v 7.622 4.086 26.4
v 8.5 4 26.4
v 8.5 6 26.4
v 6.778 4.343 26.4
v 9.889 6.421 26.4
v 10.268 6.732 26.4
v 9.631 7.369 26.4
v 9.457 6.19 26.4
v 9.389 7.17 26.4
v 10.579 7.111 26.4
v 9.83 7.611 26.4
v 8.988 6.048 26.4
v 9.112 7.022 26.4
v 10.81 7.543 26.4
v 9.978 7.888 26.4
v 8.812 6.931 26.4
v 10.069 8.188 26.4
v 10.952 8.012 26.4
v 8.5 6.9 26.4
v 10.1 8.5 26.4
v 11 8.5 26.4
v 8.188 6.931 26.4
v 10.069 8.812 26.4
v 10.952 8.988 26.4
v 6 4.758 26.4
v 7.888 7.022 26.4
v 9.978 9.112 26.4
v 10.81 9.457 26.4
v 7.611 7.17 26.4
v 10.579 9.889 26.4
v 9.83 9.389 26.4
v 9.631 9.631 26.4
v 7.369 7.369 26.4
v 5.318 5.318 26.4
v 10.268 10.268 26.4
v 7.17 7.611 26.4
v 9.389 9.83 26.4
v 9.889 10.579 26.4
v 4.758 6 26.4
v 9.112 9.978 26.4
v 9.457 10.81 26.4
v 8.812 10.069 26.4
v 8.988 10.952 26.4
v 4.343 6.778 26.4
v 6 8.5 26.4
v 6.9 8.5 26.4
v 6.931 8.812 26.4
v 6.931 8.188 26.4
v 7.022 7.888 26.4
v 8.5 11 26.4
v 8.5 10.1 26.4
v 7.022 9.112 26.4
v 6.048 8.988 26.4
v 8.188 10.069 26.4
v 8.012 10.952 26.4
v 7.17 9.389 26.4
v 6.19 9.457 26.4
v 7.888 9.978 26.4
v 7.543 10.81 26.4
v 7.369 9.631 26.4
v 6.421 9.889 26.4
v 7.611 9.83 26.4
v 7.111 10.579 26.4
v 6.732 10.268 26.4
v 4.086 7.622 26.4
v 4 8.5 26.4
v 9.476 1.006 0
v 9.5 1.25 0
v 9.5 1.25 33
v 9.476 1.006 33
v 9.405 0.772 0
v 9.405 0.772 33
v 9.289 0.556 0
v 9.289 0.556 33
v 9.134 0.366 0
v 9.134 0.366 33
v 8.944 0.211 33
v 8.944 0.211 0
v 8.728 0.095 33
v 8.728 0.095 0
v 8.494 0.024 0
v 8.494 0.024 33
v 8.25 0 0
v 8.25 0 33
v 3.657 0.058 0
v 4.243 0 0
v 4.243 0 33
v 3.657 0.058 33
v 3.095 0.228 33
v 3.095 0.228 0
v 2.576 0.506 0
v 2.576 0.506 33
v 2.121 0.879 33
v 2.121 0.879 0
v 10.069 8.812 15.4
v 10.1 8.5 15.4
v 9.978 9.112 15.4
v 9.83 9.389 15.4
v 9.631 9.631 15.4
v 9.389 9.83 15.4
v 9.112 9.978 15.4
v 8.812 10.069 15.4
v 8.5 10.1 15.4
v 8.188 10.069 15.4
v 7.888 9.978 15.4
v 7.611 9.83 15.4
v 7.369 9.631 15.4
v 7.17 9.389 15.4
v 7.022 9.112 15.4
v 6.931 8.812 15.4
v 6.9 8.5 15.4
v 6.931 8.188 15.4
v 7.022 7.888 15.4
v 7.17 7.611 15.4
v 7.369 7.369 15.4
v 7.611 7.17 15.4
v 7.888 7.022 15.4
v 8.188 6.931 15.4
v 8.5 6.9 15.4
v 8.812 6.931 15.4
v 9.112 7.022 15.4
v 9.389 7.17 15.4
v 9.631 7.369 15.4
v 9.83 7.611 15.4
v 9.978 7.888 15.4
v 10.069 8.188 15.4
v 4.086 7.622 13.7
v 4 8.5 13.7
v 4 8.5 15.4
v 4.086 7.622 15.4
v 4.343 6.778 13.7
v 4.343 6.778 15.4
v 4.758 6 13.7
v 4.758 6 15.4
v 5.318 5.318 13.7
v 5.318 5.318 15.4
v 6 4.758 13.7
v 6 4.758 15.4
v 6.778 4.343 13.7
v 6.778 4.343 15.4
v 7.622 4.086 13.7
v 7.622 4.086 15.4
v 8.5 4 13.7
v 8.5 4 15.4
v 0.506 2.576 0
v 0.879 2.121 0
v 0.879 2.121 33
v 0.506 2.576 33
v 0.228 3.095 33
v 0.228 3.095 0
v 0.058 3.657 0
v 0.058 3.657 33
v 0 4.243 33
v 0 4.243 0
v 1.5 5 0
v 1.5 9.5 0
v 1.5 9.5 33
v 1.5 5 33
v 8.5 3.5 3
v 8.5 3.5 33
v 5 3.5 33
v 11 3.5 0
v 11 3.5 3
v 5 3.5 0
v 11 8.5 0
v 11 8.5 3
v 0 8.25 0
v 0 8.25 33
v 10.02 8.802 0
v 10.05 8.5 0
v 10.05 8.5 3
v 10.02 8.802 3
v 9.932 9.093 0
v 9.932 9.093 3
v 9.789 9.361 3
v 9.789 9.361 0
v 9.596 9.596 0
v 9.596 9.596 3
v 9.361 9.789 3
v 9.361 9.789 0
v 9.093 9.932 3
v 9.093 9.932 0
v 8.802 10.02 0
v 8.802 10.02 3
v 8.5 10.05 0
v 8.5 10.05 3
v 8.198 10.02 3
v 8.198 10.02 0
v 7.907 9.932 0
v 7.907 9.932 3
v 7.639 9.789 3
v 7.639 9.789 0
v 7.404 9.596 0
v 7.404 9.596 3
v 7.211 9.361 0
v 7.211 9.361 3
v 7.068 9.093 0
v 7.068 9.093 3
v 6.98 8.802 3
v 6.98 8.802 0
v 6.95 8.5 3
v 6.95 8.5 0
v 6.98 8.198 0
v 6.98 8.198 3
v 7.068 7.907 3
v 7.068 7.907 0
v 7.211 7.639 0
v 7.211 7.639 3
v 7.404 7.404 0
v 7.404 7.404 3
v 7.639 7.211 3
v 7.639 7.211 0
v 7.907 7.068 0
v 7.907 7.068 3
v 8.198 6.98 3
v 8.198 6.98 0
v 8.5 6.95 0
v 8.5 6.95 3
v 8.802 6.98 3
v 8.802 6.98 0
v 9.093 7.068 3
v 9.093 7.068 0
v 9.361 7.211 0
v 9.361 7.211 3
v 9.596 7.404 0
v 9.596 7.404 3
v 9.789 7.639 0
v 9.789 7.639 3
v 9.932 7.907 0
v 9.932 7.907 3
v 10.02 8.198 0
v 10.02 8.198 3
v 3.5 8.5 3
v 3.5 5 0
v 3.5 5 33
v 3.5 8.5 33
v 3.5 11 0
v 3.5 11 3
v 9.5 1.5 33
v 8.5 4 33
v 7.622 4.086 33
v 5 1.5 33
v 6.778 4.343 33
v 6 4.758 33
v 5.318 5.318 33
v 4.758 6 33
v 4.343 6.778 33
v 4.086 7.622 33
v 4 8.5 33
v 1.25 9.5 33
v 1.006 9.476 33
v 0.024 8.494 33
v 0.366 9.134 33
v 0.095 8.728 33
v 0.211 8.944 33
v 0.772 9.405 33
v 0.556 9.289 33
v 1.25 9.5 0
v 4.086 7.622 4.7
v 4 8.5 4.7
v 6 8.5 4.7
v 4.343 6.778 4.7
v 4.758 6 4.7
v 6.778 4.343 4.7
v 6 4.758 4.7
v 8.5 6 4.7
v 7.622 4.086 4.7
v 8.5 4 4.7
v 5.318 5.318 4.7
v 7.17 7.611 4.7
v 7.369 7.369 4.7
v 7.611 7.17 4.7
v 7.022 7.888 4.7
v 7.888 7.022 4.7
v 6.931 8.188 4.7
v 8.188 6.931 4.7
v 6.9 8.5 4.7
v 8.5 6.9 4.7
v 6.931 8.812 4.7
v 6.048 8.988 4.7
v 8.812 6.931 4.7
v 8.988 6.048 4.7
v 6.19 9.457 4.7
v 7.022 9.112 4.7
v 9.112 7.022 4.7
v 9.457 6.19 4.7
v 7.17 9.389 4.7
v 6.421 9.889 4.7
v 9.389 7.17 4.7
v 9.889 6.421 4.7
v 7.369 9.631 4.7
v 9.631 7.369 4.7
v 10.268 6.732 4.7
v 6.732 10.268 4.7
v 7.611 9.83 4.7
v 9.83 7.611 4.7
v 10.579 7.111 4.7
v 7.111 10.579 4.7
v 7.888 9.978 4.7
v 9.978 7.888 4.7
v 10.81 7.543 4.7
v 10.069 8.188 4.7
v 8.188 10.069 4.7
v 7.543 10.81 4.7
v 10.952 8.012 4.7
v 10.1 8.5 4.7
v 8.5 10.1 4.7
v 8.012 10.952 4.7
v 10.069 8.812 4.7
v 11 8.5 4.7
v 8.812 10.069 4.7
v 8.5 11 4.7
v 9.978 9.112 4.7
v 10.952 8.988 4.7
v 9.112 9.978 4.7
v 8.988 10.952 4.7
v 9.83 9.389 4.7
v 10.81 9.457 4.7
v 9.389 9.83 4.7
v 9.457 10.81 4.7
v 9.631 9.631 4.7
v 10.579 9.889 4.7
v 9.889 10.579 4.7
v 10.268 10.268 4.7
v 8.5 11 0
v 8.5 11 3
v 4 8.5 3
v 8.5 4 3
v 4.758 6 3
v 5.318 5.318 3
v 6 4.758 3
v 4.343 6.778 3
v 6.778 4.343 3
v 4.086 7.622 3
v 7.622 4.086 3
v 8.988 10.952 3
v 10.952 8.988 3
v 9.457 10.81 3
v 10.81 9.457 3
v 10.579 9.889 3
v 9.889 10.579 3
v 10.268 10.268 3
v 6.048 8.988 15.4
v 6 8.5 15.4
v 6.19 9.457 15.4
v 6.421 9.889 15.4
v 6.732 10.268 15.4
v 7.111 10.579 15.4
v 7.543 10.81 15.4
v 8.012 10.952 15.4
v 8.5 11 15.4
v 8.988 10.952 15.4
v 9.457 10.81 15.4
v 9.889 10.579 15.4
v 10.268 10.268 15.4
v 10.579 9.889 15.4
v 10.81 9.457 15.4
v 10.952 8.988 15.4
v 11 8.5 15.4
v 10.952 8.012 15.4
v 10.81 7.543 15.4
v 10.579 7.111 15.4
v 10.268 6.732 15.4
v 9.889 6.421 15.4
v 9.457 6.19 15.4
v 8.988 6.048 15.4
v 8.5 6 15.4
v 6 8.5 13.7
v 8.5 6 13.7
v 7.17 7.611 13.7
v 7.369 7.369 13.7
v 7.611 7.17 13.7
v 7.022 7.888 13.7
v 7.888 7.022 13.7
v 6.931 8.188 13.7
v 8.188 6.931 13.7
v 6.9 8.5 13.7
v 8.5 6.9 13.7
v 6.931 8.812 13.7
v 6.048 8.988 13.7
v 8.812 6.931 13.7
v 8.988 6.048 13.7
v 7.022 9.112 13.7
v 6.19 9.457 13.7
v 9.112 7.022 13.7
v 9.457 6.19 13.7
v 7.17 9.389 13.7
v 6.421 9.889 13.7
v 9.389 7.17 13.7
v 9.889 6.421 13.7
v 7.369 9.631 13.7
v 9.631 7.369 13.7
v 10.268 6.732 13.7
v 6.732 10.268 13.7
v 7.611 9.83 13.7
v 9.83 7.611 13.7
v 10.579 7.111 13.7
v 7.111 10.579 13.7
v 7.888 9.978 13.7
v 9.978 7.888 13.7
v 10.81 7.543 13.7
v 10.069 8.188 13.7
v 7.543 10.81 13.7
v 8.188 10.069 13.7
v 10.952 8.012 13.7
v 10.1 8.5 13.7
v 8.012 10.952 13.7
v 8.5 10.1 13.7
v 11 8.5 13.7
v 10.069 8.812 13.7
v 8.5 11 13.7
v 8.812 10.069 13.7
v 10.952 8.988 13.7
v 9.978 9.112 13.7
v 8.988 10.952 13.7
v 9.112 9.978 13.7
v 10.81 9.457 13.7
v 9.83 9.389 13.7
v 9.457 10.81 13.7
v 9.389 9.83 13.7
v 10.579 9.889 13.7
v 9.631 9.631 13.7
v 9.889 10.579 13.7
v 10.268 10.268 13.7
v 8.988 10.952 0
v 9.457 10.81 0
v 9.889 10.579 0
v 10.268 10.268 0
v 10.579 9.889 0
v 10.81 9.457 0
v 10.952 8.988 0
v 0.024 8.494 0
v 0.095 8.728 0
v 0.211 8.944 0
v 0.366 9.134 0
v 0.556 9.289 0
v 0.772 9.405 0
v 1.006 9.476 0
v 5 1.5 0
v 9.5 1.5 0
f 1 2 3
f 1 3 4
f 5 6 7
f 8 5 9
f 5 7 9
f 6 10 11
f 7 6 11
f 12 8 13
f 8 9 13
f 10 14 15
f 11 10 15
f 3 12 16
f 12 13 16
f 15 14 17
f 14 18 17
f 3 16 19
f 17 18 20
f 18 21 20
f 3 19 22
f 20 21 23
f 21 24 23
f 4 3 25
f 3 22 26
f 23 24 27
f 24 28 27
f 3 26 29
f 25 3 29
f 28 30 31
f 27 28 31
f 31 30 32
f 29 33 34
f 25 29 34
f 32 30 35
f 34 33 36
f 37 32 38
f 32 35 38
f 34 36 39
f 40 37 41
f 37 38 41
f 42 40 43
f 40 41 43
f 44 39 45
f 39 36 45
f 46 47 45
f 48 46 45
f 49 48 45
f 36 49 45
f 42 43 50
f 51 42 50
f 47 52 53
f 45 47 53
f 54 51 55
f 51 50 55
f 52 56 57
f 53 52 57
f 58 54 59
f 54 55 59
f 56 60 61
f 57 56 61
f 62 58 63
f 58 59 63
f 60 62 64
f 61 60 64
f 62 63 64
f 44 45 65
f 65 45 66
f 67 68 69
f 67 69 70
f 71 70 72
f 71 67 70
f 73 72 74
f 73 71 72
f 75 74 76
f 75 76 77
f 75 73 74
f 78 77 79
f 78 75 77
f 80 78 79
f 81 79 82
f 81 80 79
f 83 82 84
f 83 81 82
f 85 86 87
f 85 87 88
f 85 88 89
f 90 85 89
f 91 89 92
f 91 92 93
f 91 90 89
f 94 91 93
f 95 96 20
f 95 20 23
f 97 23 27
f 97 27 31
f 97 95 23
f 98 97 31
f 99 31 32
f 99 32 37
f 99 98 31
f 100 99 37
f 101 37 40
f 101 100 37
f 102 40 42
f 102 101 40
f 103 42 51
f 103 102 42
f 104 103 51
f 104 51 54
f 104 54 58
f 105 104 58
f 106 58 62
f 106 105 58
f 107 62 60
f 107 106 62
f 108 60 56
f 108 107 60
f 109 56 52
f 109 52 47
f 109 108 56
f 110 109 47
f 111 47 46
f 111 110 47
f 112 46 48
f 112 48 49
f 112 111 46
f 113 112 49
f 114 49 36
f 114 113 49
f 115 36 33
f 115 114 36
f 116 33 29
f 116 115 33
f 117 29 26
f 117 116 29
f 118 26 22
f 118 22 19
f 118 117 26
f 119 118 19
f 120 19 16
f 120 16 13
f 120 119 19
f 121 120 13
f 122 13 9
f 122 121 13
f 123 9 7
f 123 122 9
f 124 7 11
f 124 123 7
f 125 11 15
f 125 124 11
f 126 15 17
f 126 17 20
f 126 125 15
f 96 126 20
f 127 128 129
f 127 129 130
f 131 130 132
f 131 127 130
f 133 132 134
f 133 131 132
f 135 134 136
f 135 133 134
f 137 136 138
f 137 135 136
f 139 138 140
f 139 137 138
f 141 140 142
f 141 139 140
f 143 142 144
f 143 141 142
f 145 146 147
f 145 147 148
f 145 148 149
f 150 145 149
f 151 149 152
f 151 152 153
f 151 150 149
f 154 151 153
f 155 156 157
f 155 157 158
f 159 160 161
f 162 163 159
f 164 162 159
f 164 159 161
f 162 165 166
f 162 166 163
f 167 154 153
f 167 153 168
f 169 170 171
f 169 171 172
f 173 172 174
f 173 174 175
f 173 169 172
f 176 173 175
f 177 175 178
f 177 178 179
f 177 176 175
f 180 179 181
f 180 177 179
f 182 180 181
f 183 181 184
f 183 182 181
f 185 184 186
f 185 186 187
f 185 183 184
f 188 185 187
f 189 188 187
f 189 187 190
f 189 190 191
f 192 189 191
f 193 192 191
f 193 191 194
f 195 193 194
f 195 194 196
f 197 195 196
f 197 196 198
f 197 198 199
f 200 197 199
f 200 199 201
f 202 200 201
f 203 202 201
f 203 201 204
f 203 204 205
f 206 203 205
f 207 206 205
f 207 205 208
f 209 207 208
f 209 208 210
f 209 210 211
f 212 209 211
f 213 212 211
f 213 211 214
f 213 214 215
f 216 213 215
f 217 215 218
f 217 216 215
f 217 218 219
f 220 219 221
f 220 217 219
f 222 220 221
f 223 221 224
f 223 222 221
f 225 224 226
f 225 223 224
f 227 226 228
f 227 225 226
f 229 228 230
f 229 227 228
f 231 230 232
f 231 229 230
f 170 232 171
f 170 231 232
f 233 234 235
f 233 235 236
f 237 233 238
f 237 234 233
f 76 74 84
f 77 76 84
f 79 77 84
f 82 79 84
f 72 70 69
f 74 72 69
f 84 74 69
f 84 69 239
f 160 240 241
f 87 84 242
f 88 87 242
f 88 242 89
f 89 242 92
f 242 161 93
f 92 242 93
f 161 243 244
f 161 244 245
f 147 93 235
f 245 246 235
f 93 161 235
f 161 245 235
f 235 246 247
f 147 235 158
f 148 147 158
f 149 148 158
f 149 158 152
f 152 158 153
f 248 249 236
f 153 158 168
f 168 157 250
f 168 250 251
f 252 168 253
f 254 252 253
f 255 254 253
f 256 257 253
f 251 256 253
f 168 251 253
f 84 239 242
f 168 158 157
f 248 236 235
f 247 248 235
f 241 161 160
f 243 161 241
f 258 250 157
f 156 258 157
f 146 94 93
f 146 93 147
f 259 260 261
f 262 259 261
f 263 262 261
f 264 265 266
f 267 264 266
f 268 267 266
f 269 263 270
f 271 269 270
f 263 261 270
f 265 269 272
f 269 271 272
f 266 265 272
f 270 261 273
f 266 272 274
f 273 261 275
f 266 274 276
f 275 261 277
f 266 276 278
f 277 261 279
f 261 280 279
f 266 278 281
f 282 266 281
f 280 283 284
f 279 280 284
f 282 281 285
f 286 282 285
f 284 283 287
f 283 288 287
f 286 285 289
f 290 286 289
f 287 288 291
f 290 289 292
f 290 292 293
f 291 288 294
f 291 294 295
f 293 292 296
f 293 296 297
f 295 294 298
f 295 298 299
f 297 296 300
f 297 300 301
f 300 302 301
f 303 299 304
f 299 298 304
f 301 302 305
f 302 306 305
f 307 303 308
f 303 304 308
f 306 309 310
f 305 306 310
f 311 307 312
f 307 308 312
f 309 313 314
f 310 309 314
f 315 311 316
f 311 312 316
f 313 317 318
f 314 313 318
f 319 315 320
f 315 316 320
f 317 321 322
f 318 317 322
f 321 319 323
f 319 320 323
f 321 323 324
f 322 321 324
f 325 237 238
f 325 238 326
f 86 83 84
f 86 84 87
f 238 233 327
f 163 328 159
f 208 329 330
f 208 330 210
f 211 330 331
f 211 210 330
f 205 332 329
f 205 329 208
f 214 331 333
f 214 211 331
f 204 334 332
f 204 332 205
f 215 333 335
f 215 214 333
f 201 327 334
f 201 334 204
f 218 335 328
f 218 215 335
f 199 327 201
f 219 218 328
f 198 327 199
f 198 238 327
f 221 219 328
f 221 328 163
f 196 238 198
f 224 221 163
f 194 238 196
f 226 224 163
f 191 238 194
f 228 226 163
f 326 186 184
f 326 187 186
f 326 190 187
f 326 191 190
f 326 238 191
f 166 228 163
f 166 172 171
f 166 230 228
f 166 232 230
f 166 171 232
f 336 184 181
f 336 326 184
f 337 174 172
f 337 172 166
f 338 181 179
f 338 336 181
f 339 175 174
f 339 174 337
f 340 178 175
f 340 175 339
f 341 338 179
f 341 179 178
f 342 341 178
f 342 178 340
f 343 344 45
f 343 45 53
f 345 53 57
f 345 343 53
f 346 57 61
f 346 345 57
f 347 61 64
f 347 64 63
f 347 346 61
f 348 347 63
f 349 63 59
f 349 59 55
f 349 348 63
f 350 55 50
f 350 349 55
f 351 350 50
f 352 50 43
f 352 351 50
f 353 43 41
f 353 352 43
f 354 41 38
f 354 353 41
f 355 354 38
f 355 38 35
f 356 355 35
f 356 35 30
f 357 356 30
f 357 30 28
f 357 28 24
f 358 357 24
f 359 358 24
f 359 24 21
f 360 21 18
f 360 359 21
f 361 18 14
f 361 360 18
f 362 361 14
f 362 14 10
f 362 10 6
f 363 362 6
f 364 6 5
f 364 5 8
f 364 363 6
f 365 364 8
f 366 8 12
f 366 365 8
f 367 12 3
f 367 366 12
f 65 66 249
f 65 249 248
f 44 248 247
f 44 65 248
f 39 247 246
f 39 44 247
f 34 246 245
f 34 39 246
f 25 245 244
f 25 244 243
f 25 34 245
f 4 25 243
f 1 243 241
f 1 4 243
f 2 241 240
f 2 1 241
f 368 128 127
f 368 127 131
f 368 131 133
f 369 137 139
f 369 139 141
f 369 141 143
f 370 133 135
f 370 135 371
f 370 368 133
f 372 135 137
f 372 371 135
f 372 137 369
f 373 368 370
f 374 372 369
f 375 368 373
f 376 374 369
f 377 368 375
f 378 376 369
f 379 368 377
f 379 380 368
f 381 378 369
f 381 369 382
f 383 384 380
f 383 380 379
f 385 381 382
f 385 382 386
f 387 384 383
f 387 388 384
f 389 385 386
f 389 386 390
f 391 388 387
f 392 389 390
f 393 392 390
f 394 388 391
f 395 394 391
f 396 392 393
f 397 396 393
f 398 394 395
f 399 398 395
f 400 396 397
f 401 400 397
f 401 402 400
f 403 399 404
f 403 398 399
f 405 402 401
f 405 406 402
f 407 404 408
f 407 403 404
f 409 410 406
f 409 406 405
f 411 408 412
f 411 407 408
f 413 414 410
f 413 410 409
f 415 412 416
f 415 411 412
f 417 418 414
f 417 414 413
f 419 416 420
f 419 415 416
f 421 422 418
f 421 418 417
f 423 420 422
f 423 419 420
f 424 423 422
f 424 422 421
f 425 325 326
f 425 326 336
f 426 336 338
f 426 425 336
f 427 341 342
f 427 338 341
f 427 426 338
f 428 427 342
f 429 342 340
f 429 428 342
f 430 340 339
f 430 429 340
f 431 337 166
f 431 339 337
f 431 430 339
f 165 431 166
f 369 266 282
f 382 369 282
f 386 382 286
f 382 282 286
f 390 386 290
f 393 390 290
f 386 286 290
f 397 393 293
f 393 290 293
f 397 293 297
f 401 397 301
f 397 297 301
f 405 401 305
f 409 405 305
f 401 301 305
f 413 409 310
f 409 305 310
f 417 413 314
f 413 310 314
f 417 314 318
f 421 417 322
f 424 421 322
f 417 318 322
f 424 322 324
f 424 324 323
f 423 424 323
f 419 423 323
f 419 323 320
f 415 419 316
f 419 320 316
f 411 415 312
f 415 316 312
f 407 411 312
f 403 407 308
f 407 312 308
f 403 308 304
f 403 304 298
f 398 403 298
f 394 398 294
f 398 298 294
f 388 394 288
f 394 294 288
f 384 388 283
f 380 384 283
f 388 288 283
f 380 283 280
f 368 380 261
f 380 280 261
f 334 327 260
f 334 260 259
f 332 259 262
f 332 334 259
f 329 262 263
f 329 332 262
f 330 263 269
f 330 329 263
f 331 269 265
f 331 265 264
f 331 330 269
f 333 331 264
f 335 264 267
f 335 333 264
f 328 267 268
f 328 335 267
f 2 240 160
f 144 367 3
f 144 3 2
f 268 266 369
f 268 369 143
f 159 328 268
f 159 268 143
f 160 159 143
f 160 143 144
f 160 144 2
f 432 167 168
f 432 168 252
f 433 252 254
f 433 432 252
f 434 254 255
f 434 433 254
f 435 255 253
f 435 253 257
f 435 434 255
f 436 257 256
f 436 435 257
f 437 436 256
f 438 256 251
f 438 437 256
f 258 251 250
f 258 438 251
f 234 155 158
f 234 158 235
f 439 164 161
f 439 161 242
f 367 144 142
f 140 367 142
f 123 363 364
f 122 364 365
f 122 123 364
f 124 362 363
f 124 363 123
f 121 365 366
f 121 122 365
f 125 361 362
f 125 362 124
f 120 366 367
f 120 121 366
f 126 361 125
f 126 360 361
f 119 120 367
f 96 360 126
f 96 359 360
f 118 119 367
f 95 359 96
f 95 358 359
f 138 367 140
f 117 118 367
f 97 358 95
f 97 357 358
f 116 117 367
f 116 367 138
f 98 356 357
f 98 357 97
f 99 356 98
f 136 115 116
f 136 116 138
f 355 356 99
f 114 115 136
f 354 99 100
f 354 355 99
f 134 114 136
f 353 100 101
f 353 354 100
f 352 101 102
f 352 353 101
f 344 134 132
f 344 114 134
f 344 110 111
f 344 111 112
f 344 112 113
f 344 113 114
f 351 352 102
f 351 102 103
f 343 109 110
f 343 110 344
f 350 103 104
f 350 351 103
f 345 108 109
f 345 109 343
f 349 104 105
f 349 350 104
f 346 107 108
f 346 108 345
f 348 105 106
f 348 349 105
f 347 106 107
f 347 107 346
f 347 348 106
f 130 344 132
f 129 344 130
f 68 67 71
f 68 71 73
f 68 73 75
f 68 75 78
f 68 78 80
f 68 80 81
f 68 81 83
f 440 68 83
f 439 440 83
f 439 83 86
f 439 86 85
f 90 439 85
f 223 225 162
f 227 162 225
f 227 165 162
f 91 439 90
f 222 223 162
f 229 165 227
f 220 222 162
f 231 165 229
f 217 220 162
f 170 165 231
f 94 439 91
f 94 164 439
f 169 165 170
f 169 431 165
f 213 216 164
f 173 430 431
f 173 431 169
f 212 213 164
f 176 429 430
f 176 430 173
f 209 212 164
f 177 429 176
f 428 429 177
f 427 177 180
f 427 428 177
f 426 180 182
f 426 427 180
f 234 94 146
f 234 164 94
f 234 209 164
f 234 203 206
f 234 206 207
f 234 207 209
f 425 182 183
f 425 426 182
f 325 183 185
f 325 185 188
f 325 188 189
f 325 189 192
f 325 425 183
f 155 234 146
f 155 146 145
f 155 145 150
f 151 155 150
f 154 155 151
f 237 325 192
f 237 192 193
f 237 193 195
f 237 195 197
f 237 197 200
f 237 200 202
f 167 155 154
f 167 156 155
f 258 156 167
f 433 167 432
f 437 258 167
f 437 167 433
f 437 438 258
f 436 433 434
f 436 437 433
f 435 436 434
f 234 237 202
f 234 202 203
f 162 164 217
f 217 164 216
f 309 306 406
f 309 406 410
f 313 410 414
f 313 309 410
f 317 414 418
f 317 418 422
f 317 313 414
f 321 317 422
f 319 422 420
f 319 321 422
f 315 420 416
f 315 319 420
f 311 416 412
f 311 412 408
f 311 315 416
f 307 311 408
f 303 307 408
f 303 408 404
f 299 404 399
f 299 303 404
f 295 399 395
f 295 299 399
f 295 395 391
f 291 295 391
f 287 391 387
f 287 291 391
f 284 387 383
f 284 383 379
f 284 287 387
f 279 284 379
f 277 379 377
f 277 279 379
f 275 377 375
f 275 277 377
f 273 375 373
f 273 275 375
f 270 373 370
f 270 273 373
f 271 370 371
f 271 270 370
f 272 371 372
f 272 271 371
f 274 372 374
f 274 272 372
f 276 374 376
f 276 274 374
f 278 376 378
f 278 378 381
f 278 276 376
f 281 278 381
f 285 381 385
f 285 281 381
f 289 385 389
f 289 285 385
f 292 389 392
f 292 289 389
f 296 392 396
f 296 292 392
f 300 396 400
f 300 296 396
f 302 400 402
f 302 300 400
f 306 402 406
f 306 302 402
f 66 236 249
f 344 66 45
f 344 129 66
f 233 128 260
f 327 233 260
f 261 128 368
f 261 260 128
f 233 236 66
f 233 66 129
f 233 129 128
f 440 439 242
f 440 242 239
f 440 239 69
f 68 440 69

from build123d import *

# Parameters (mm, degrees)
SKETCH1_R              = 1.55
BOSS_EXTRUDE1_DEPTH    = 33
CUT_EXTRUDE2_START     = 3
CUT_EXTRUDE2_OUTLINE_R = 1.55
CUT_EXTRUDE2_DEPTH     = 30
BOSS_EXTRUDE3_START    = 15.4
SKETCH7_R              = 1.6
BOSS_EXTRUDE3_DEPTH    = 11
SKETCH14_R             = 1.6
BOSS_EXTRUDE4_DEPTH    = 9


# Read off the part's stored shape, not the designer's step: Cut-Extrude2
with BuildPart() as part:
    # Sketch1 → Boss-Extrude1 (new body)
    with BuildSketch(Plane.XY):
        with BuildLine():
            Line((9.5, 1.5), (9.5, 1.25))
            ThreePointArc((9.5, 1.25), (9.133883476, 0.366116524), (8.25, 0))
            Line((8.25, 0), (4.242640687, 0))
            ThreePointArc((4.242640687, 0), (3.09459039, 0.228361402), (2.121320344, 0.878679656))
            Line((2.121320344, 0.878679656), (0.878679656, 2.121320344))
            ThreePointArc((0.878679656, 2.121320344), (0.228361402, 3.09459039), (0, 4.242640687))
            Line((0, 4.242640687), (0, 8.25))
            ThreePointArc((0, 8.25), (0.366116524, 9.133883476), (1.25, 9.5))
            Line((1.25, 9.5), (1.5, 9.5))
            Line((1.5, 9.5), (1.5, 5))
            Line((1.5, 5), (3.5, 5))
            Line((3.5, 5), (3.5, 11))
            Line((3.5, 11), (8.5, 11))
            ThreePointArc((8.5, 11), (10.267766953, 10.267766953), (11, 8.5))
            Line((11, 8.5), (11, 3.5))
            Line((11, 3.5), (5, 3.5))
            Line((5, 3.5), (5, 1.5))
            Line((5, 1.5), (9.5, 1.5))
        make_face()
        with Locations((8.5, 8.5)):
            Circle(SKETCH1_R, mode=Mode.SUBTRACT)
    extrude(amount=BOSS_EXTRUDE1_DEPTH)

    # Cut-Extrude2 outline → Cut-Extrude2 (cut)
    with BuildSketch(Plane.XY.offset(CUT_EXTRUDE2_START)):
        with BuildLine():
            Line((3.5, 8.5), (4, 8.5))
            ThreePointArc((4, 8.5), (5.318019485, 5.318019485), (8.5, 4))
            Line((8.5, 4), (8.5, 3.5))
            Line((8.5, 3.5), (11, 3.5))
            Line((11, 3.5), (11, 8.5))
            ThreePointArc((11, 8.5), (10.267766953, 10.267766953), (8.5, 11))
            Line((8.5, 11), (3.5, 11))
            Line((3.5, 11), (3.5, 8.5))
        make_face()
        with Locations((8.5, 8.5)):
            Circle(CUT_EXTRUDE2_OUTLINE_R, mode=Mode.SUBTRACT)
    extrude(amount=CUT_EXTRUDE2_DEPTH, mode=Mode.SUBTRACT)

    # Sketch7 → Boss-Extrude3 (add)
    with BuildSketch(Plane.XY.offset(BOSS_EXTRUDE3_START)):
        with BuildLine():
            Line((8.5, 6), (8.5, 4))
            ThreePointArc((8.5, 4), (5.318019485, 5.318019485), (4, 8.5))
            Line((4, 8.5), (6, 8.5))
            ThreePointArc((6, 8.5), (10.267766953, 10.267766953), (8.5, 6))
        make_face()
        with Locations((8.5, 8.5)):
            Circle(SKETCH7_R, mode=Mode.SUBTRACT)
    extrude(amount=BOSS_EXTRUDE3_DEPTH)

    # Sketch14 → Boss-Extrude4 (add)
    with BuildSketch(Plane.XY.offset(4.7)):
        with BuildLine():
            Line((6, 8.5), (4, 8.5))
            ThreePointArc((4, 8.5), (5.318019485, 5.318019485), (8.5, 4))
            Line((8.5, 4), (8.5, 6))
            ThreePointArc((8.5, 6), (10.267766953, 10.267766953), (6, 8.5))
        make_face()
        with Locations((8.5, 8.5)):
            Circle(SKETCH14_R, mode=Mode.SUBTRACT)
    extrude(amount=BOSS_EXTRUDE4_DEPTH)


solid = part.part
